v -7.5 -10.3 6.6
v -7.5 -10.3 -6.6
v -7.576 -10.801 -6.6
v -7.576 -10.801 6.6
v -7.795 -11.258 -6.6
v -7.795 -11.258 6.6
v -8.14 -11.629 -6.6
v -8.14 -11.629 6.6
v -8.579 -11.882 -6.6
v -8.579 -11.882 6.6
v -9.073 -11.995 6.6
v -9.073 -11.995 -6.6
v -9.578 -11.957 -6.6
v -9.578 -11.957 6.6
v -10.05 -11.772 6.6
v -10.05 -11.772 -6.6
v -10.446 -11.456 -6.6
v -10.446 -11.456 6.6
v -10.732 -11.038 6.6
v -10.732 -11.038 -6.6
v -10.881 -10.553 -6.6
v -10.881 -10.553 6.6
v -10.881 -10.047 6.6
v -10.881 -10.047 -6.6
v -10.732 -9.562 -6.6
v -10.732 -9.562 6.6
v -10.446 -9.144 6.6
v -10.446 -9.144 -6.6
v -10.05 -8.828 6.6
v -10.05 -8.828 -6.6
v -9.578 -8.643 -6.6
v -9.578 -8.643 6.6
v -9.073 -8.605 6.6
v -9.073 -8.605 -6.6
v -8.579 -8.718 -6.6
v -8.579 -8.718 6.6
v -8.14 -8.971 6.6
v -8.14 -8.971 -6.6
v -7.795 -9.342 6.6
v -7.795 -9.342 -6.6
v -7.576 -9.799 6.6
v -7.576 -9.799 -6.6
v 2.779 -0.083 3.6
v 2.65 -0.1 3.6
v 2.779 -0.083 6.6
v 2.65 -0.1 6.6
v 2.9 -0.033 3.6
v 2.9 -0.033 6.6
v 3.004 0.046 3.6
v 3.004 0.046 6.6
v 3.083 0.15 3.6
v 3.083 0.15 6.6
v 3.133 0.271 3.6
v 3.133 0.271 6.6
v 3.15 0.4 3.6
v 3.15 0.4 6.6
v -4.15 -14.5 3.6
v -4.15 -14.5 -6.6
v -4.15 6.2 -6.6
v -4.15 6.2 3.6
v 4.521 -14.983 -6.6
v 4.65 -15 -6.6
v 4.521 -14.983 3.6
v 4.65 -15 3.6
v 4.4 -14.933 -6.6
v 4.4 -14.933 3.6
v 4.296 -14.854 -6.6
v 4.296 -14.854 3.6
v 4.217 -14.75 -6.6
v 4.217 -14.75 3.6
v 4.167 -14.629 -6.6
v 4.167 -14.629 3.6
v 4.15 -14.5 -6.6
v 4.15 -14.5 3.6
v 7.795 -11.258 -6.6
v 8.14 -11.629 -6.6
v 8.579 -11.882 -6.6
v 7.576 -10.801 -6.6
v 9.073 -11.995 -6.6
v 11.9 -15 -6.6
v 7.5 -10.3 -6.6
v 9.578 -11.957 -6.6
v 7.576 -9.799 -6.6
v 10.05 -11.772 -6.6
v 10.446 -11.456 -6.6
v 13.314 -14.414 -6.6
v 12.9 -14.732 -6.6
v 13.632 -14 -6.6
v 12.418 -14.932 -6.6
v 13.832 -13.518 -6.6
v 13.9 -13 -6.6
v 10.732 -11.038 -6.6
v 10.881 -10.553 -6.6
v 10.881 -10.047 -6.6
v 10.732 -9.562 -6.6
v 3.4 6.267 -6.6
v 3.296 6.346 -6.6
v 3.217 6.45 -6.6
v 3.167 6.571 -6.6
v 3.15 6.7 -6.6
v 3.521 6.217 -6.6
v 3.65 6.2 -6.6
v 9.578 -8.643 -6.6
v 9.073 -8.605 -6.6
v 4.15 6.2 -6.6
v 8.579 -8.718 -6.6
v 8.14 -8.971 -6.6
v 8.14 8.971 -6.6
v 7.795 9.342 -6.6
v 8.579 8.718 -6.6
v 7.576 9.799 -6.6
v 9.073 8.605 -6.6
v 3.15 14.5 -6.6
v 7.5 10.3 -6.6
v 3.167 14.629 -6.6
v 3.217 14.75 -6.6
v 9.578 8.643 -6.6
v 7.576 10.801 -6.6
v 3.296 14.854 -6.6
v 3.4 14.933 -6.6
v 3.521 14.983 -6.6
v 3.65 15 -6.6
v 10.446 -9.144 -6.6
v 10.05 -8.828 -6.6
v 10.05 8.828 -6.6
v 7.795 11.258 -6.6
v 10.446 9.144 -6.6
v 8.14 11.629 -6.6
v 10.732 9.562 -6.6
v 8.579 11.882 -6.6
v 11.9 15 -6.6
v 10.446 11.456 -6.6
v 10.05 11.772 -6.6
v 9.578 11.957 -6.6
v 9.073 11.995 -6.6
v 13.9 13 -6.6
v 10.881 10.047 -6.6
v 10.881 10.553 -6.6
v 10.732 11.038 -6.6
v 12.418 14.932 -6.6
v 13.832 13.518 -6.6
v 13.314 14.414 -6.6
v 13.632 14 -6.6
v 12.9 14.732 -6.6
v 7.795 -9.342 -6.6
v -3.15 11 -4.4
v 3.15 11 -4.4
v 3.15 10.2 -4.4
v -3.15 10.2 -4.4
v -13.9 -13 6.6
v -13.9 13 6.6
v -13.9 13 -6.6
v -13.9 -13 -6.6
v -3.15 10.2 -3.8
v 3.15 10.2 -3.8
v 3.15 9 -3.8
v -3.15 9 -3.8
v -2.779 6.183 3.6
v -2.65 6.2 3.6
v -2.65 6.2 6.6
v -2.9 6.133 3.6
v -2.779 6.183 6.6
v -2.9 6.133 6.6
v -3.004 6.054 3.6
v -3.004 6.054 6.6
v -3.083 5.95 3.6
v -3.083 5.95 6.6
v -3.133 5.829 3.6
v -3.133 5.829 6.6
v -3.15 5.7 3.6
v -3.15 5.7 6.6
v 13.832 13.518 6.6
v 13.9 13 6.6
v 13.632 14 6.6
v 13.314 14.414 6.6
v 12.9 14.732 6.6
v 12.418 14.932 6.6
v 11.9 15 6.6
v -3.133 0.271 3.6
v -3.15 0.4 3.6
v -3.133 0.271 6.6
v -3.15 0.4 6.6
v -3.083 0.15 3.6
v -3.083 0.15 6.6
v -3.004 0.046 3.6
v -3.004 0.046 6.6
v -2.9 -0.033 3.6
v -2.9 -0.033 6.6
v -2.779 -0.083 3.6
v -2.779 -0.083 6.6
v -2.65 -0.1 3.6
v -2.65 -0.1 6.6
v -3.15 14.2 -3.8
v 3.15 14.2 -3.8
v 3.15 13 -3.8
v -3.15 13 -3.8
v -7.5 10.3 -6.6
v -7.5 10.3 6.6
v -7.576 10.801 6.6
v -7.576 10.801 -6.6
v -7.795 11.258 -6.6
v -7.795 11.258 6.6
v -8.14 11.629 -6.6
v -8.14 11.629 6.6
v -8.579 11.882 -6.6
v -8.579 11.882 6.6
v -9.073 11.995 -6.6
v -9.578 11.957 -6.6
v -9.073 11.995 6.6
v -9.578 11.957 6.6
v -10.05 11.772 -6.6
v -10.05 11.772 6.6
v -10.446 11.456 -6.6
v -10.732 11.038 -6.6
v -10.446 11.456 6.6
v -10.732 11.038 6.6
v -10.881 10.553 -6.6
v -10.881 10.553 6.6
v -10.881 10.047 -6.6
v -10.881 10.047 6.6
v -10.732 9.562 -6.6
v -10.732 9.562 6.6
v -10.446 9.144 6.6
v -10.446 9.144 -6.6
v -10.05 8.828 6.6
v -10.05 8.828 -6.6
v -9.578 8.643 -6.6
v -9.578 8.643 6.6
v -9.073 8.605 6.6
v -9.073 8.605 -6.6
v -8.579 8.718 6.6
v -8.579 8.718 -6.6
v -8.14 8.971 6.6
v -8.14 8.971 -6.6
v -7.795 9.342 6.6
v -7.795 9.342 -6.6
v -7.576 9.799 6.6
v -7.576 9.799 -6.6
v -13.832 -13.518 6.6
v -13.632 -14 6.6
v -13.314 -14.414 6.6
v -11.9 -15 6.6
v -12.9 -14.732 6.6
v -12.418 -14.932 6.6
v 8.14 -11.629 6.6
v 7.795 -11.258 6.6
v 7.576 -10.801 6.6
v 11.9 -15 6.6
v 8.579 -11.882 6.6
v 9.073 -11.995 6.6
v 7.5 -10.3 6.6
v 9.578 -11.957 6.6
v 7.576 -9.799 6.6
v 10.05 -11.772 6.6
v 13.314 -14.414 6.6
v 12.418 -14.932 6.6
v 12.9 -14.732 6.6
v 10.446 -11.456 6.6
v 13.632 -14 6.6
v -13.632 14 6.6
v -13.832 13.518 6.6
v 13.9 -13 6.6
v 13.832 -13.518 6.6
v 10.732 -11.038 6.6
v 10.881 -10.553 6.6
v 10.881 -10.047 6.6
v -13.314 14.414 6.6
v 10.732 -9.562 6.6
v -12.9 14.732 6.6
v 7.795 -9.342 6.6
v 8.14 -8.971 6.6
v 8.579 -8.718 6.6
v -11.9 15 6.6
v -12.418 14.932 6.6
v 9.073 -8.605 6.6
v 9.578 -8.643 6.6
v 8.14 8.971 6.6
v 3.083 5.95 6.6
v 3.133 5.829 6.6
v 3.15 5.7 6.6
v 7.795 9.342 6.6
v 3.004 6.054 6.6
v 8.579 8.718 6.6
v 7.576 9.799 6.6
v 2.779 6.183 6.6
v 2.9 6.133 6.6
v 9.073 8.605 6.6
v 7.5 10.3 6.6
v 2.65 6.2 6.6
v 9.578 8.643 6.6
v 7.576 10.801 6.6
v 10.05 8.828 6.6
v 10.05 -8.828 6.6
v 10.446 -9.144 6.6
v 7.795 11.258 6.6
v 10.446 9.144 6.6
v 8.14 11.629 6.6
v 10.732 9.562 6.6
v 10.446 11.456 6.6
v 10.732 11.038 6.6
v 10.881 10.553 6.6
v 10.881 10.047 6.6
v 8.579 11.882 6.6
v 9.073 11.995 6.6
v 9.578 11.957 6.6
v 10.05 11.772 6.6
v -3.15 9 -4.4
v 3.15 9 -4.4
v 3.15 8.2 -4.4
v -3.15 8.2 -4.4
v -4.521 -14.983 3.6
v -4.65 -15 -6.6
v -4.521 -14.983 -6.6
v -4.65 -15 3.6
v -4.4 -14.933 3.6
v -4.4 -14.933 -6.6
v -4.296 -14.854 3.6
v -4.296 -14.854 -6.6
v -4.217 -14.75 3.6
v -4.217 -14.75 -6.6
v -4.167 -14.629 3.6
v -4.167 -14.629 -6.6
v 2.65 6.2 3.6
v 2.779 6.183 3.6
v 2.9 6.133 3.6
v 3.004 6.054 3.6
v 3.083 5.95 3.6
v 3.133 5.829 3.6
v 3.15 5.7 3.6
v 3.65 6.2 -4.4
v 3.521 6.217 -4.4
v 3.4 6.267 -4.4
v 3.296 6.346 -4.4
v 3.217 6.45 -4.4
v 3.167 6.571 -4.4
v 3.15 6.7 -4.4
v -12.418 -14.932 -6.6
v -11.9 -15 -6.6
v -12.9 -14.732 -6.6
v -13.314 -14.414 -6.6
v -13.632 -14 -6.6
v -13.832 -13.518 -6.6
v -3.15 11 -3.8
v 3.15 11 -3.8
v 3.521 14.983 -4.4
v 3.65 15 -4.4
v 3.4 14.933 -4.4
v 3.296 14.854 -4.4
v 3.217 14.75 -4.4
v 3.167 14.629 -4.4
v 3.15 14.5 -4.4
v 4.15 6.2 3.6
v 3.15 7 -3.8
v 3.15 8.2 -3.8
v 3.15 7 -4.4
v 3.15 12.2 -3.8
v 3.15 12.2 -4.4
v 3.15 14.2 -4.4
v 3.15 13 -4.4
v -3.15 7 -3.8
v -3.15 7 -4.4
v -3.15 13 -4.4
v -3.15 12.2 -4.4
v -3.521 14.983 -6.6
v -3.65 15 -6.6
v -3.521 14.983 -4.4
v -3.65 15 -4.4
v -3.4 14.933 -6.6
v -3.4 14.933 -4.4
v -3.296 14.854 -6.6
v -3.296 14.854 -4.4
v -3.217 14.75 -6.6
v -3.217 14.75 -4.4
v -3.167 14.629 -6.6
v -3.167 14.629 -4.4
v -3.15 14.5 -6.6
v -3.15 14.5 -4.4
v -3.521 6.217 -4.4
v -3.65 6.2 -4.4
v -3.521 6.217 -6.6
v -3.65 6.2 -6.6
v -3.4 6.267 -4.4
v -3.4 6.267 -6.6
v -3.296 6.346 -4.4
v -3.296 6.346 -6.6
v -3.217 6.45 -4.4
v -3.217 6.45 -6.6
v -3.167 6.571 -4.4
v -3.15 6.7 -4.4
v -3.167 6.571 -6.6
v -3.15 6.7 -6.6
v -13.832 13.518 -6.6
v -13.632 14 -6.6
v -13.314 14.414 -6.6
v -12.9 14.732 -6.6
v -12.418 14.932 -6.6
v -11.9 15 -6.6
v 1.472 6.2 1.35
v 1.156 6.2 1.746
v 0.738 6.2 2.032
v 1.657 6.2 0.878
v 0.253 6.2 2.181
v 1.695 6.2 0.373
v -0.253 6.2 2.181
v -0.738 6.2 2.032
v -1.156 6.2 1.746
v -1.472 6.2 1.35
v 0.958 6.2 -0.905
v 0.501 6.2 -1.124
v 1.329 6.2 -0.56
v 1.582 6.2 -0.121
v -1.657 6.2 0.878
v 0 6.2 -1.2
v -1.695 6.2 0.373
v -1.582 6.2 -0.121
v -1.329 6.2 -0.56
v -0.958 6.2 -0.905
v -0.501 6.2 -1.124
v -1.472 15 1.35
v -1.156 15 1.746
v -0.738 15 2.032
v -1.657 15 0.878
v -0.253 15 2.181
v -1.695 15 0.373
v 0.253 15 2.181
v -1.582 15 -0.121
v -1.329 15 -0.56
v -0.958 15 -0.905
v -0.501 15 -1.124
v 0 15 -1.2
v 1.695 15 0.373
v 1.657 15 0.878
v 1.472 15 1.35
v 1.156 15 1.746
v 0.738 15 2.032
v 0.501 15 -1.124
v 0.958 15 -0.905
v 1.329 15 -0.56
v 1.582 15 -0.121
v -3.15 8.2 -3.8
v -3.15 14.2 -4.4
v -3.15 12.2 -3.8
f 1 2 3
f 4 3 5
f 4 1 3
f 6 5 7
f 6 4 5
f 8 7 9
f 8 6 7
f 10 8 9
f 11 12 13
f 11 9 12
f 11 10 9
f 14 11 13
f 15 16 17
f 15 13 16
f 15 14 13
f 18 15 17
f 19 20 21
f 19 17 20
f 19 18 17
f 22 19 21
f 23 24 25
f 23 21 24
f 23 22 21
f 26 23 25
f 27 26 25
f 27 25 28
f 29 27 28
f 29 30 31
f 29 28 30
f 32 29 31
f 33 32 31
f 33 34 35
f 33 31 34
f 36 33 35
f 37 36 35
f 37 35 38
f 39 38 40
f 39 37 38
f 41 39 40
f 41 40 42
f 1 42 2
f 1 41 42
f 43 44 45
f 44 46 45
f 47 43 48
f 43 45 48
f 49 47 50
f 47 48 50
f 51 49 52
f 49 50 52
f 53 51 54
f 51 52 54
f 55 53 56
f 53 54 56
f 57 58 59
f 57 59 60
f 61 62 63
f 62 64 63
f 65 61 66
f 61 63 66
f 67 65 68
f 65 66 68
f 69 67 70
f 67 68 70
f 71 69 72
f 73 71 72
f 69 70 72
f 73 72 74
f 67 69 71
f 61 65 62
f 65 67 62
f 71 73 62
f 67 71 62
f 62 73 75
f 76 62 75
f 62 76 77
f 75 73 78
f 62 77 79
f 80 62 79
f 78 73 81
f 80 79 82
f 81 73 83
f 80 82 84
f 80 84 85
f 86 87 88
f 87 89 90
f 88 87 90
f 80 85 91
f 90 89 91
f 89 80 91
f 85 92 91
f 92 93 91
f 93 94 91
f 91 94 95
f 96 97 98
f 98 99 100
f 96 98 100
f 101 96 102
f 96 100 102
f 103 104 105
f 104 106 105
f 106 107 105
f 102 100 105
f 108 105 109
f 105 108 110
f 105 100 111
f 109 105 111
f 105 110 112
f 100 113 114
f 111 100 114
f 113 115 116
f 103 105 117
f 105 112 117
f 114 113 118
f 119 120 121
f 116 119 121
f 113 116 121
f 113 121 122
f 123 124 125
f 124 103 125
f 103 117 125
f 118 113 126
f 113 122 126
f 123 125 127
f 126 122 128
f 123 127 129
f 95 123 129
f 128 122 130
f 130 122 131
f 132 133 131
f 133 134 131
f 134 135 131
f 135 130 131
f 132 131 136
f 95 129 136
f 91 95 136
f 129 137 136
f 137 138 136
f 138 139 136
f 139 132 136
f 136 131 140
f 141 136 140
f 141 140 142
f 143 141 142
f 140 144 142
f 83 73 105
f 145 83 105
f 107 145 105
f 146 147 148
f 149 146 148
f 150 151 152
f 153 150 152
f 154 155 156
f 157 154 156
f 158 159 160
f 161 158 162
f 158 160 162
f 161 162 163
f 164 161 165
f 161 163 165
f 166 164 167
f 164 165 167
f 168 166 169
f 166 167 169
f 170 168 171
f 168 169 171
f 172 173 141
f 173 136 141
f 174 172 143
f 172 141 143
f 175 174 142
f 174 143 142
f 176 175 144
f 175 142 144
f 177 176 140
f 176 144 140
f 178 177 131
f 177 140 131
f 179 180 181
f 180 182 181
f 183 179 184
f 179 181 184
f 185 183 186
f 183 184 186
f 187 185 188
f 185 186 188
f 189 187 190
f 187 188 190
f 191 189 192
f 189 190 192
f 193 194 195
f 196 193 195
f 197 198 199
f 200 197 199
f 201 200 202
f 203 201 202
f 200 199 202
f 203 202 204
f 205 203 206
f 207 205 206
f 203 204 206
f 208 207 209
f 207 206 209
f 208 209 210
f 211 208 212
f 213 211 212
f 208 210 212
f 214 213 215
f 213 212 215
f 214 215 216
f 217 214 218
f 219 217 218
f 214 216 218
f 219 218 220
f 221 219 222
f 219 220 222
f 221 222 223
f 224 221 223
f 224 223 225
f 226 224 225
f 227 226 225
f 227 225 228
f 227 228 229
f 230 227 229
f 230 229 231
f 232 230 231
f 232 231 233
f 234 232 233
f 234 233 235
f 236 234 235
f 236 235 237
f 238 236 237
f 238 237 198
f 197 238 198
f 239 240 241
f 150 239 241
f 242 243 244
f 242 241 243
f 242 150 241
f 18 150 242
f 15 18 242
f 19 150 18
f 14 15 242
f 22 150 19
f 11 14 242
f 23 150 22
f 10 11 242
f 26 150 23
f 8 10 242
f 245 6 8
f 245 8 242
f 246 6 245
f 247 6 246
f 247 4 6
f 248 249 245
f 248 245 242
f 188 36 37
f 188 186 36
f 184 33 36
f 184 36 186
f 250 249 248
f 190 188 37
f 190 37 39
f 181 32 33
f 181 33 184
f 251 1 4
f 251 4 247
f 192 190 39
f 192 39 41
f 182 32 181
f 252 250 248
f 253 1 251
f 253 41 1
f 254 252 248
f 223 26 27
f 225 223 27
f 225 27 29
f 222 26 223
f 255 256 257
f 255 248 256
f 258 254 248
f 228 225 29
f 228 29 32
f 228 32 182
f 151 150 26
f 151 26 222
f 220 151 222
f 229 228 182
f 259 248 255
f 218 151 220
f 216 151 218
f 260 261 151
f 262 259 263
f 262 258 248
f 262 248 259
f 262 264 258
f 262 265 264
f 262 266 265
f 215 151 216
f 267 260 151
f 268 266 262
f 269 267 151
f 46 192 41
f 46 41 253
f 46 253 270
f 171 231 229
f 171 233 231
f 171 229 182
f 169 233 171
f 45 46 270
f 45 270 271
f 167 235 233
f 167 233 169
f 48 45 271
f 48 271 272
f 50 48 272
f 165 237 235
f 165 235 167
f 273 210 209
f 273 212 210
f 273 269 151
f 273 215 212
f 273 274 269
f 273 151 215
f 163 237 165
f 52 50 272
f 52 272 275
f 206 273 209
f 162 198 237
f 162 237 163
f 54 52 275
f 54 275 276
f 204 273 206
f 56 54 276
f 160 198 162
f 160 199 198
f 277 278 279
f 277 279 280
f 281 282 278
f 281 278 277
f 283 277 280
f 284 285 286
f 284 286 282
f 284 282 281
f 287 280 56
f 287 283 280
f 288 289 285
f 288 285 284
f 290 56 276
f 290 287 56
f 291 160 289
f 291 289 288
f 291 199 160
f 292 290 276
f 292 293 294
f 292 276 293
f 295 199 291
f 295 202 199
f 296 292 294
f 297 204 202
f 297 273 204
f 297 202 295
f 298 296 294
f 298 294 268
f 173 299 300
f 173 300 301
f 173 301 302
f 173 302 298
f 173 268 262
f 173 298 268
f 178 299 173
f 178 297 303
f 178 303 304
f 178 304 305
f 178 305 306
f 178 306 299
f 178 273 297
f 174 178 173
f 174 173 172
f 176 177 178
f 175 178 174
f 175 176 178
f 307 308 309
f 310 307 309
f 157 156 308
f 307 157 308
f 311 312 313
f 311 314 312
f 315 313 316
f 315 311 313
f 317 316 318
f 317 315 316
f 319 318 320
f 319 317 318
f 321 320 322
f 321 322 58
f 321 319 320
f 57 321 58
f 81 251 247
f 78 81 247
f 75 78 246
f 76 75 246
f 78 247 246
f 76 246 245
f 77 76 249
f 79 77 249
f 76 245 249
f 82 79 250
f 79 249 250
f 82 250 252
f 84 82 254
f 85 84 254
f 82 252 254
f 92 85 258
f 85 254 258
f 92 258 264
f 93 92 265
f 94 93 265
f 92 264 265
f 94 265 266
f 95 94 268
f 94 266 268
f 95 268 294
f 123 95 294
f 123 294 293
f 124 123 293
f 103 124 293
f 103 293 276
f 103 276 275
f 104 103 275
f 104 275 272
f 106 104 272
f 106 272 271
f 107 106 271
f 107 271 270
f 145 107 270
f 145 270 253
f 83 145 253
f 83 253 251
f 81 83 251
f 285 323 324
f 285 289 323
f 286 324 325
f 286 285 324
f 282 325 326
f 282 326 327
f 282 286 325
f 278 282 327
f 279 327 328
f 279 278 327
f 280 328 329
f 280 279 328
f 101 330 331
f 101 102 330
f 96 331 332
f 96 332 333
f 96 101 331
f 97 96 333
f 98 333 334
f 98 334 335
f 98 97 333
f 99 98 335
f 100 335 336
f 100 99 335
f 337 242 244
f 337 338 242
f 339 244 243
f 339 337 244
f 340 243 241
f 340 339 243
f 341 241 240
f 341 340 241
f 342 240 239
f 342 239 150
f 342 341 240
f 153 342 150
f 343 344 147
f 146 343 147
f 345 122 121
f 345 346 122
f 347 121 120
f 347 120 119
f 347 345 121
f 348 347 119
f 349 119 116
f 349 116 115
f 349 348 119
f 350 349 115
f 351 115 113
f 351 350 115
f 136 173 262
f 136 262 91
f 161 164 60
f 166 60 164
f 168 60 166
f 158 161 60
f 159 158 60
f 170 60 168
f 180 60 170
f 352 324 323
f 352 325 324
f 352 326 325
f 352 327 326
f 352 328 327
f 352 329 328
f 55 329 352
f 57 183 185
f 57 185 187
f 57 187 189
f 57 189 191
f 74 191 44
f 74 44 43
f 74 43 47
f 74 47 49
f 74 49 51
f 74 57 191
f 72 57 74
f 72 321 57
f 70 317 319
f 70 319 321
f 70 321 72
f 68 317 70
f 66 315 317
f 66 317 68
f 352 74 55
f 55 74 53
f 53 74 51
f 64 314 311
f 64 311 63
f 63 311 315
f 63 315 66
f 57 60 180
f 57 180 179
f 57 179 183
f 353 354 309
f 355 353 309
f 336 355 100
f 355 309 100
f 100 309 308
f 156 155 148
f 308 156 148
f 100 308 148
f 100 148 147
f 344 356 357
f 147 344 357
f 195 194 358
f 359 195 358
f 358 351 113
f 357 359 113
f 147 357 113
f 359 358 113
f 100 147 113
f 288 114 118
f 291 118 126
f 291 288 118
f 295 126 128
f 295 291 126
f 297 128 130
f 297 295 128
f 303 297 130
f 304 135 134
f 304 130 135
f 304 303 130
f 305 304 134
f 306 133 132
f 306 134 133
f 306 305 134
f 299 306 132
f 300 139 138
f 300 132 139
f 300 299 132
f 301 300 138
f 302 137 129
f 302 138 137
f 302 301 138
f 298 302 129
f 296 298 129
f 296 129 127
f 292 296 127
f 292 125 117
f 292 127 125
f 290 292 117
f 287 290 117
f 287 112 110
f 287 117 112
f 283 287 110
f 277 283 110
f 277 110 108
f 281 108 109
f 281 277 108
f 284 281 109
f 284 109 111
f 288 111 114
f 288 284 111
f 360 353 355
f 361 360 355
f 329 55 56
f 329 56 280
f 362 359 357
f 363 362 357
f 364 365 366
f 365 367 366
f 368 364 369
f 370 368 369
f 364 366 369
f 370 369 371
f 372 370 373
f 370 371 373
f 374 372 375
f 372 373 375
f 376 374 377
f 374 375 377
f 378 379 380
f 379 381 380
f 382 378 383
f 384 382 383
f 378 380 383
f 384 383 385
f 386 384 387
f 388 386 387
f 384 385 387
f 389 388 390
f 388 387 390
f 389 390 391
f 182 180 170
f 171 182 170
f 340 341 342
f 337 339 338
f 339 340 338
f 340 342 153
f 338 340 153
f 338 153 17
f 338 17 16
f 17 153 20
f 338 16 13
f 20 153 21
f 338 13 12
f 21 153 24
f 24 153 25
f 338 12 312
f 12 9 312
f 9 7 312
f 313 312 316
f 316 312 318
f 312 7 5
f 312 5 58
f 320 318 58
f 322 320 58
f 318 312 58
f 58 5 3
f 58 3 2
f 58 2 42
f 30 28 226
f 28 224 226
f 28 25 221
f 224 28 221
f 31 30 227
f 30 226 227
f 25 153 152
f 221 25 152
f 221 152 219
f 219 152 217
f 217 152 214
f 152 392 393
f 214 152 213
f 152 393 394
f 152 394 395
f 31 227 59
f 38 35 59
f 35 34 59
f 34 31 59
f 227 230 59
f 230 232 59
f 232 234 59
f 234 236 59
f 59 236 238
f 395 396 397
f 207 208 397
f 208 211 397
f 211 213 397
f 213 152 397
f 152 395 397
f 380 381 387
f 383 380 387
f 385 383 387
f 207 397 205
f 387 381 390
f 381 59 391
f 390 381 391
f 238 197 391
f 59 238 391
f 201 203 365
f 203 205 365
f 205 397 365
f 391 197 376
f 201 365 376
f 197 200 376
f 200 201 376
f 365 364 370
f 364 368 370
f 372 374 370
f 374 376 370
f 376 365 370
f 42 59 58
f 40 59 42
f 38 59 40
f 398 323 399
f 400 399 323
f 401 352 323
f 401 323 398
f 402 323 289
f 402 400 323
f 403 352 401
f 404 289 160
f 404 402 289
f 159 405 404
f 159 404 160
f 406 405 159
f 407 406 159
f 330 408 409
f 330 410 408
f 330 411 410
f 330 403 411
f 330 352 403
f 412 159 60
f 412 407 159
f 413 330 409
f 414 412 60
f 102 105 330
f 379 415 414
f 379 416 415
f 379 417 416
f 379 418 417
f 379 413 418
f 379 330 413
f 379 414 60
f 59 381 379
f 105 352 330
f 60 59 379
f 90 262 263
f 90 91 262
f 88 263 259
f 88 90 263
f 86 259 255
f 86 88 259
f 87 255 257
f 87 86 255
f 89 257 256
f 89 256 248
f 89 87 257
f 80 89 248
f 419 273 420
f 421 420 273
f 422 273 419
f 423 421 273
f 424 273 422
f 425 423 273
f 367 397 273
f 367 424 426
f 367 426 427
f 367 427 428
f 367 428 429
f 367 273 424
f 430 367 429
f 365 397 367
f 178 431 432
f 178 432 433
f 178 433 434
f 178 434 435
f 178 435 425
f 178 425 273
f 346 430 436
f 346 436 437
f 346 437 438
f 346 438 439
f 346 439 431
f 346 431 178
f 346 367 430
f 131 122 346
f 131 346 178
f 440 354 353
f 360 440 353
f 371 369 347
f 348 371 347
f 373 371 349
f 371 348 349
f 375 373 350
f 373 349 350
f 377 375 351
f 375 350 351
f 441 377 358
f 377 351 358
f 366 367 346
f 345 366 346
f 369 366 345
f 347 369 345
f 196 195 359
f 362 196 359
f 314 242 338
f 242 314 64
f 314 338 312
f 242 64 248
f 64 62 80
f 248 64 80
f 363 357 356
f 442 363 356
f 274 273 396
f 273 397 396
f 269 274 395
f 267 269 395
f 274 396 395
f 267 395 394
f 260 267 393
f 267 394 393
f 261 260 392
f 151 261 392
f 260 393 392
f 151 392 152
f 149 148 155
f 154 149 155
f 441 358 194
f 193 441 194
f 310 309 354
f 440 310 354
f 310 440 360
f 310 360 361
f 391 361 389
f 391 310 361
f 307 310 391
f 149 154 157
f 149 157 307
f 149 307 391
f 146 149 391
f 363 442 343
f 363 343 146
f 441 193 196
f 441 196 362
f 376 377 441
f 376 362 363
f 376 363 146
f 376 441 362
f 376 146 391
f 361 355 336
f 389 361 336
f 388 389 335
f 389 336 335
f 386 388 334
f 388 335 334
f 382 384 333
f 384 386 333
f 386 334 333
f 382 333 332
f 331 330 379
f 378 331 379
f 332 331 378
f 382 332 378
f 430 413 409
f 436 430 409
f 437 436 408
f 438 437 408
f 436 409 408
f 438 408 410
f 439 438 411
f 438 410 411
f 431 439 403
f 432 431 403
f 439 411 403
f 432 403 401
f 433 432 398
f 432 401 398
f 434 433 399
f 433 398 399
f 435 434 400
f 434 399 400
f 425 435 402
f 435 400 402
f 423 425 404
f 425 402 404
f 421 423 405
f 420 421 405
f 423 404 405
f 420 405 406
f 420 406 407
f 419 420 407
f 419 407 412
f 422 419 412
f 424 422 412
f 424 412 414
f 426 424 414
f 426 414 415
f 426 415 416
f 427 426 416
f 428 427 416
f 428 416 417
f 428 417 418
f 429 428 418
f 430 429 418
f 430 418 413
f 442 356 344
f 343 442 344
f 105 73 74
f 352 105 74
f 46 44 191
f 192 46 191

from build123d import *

# Parameters (mm, degrees)
SKETCH2_W               = 27.8
SKETCH2_H               = 13.2
BOSS_EXTRUDE1_DEPTH     = 15
SKETCH7_R               = 1.7
CUT_EXTRUDE1_DEPTH      = 25.340295808
MIRROR2_COPY_1_SKETCH_R = 1.7
MIRROR2_COPY_1_DEPTH    = 25.340295808
SKETCH8_W               = 8.3
SKETCH8_H               = 10.2
CUT_EXTRUDE2_DEPTH      = 21.2
CUT_EXTRUDE5_START      = 1
CUT_EXTRUDE5_DEPTH      = 6.3
SKETCH12_W              = 6.3
SKETCH12_H              = 6.3
CUT_EXTRUDE6_DEPTH      = 23.852789764
FILLET4_R               = 0.5
FILLET3_R               = 2
FILLET5_R               = 0.5
SKETCH13_R              = 1.7
CUT_EXTRUDE7_DEPTH      = 27.195610319


with BuildPart() as part:
    # Sketch2 → Boss-Extrude1 (new, symmetric)
    with BuildSketch(Plane(origin=(0, 0, 0), x_dir=(1, 0, 0), z_dir=(0, 1, 0))):
        Rectangle(SKETCH2_W, SKETCH2_H)
    extrude(amount=BOSS_EXTRUDE1_DEPTH, both=True)

    # Sketch7 → Cut-Extrude1 (cut, through all)
    with BuildSketch(Plane.XY.offset(6.6)):
        with Locations((-9.2, 10.3)):
            Circle(SKETCH7_R)
    cut_extrude1 = extrude(amount=-CUT_EXTRUDE1_DEPTH, mode=Mode.SUBTRACT)

    # Mirror1: Cut-Extrude1 across plane
    add(cut_extrude1.mirror(Plane(origin=(0, 0, 0), x_dir=(0, 0, 1), z_dir=(1, 0, 0))), mode=Mode.SUBTRACT)

    # Mirror2: Cut-Extrude1 across plane
    add(cut_extrude1.mirror(Plane.ZX), mode=Mode.SUBTRACT)

    # Mirror2 copy 1 sketch → Mirror2 copy 1 (cut, through all)
    with BuildSketch(Plane(origin=(0, 0, 6.6), x_dir=(-1, 0, 0), z_dir=(0, 0, 1))):
        with Locations((-9.2, 10.3)):
            Circle(MIRROR2_COPY_1_SKETCH_R)
    extrude(amount=-MIRROR2_COPY_1_DEPTH, mode=Mode.SUBTRACT)

    # Sketch8 → Cut-Extrude2 (cut)
    with BuildSketch(Plane.XZ.offset(15)):
        with Locations((0, -1.5)):
            Rectangle(SKETCH8_W, SKETCH8_H)
    extrude(amount=-CUT_EXTRUDE2_DEPTH, mode=Mode.SUBTRACT)

    # Sketch11 → Cut-Extrude5 (cut)
    with BuildSketch(Plane.ZY.offset(-4.15).offset(CUT_EXTRUDE5_START)):
        Polygon((-11.6, 15), (-4.4, 15), (-4.4, 14.2), (-3.8, 14.2), (-3.8, 13), (-4.4, 13), (-4.4, 12.2), (-3.8, 12.2), (-3.8, 11), (-4.4, 11), (-4.4, 10.2), (-3.8, 10.2), (-3.8, 9), (-4.4, 9), (-4.4, 8.2), (-3.8, 8.2), (-3.8, 7), (-4.4, 7), (-4.4, 6.2), (-11.6, 6.2), align=None)
    extrude(amount=CUT_EXTRUDE5_DEPTH, mode=Mode.SUBTRACT)

    # Sketch12 → Cut-Extrude6 (cut, through all)
    with BuildSketch(Plane(origin=(0, 0, 3.6), x_dir=(-1, 0, 0), z_dir=(0, 0, -1))):
        with Locations((0, 3.05)):
            Rectangle(SKETCH12_W, SKETCH12_H)
    extrude(amount=-CUT_EXTRUDE6_DEPTH, mode=Mode.SUBTRACT)

    # Fillet4
    fillet4_edges = [part.edges().sort_by_distance(p)[0] for p in [
        (-3.15, 6.2, 5.1),
        (-3.15, -0.1, 5.1),
        (3.15, -0.1, 5.1),
        (3.15, 6.2, 5.1),
    ]]
    fillet(fillet4_edges, radius=FILLET4_R)

    # Fillet3
    fillet3_edges = [part.edges().sort_by_distance(p)[0] for p in [
        (-13.9, 15, 0),
        (13.9, 15, 0),
        (-13.9, -15, 0),
        (13.9, -15, 0),
    ]]
    fillet(fillet3_edges, radius=FILLET3_R)

    # Fillet5
    fillet5_edges = [part.edges().sort_by_distance(p)[0] for p in [
        (4.15, -15, -1.5),
        (-4.15, -15, -1.5),
        (-3.15, 6.2, -5.5),
        (3.15, 6.2, -5.5),
        (3.15, 15, -5.5),
        (-3.15, 15, -5.5),
    ]]
    fillet(fillet5_edges, radius=FILLET5_R)

    # Sketch13 → Cut-Extrude7 (cut, through all)
    with BuildSketch(Plane.XZ.offset(-6.2)):
        with Locations(Location((0, 0.5, 0), (0, 0, 270))):
            Circle(SKETCH13_R)
    extrude(amount=-CUT_EXTRUDE7_DEPTH, mode=Mode.SUBTRACT)


solid = part.part
